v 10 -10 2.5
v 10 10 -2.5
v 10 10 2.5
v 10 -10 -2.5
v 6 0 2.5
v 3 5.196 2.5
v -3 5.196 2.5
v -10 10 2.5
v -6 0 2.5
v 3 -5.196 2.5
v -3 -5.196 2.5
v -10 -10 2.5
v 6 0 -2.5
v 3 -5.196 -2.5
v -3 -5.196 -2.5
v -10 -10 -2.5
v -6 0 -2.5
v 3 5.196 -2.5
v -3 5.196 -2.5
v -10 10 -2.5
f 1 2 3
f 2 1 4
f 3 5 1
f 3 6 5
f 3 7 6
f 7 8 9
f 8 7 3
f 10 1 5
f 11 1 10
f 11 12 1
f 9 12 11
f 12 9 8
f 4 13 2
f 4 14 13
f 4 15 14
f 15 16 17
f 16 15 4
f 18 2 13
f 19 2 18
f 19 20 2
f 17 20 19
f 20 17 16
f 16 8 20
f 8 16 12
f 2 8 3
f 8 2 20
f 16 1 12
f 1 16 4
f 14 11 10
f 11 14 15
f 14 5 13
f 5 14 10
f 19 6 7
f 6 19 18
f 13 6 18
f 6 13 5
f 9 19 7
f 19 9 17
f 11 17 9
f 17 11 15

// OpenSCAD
// M6 nut socket

difference(){
	// Create your socket here
	cube([20,20,5],center=true); 

	// Nut dimensions
	cylinder(h=6,r=6,$fn=6,center=true);
}
